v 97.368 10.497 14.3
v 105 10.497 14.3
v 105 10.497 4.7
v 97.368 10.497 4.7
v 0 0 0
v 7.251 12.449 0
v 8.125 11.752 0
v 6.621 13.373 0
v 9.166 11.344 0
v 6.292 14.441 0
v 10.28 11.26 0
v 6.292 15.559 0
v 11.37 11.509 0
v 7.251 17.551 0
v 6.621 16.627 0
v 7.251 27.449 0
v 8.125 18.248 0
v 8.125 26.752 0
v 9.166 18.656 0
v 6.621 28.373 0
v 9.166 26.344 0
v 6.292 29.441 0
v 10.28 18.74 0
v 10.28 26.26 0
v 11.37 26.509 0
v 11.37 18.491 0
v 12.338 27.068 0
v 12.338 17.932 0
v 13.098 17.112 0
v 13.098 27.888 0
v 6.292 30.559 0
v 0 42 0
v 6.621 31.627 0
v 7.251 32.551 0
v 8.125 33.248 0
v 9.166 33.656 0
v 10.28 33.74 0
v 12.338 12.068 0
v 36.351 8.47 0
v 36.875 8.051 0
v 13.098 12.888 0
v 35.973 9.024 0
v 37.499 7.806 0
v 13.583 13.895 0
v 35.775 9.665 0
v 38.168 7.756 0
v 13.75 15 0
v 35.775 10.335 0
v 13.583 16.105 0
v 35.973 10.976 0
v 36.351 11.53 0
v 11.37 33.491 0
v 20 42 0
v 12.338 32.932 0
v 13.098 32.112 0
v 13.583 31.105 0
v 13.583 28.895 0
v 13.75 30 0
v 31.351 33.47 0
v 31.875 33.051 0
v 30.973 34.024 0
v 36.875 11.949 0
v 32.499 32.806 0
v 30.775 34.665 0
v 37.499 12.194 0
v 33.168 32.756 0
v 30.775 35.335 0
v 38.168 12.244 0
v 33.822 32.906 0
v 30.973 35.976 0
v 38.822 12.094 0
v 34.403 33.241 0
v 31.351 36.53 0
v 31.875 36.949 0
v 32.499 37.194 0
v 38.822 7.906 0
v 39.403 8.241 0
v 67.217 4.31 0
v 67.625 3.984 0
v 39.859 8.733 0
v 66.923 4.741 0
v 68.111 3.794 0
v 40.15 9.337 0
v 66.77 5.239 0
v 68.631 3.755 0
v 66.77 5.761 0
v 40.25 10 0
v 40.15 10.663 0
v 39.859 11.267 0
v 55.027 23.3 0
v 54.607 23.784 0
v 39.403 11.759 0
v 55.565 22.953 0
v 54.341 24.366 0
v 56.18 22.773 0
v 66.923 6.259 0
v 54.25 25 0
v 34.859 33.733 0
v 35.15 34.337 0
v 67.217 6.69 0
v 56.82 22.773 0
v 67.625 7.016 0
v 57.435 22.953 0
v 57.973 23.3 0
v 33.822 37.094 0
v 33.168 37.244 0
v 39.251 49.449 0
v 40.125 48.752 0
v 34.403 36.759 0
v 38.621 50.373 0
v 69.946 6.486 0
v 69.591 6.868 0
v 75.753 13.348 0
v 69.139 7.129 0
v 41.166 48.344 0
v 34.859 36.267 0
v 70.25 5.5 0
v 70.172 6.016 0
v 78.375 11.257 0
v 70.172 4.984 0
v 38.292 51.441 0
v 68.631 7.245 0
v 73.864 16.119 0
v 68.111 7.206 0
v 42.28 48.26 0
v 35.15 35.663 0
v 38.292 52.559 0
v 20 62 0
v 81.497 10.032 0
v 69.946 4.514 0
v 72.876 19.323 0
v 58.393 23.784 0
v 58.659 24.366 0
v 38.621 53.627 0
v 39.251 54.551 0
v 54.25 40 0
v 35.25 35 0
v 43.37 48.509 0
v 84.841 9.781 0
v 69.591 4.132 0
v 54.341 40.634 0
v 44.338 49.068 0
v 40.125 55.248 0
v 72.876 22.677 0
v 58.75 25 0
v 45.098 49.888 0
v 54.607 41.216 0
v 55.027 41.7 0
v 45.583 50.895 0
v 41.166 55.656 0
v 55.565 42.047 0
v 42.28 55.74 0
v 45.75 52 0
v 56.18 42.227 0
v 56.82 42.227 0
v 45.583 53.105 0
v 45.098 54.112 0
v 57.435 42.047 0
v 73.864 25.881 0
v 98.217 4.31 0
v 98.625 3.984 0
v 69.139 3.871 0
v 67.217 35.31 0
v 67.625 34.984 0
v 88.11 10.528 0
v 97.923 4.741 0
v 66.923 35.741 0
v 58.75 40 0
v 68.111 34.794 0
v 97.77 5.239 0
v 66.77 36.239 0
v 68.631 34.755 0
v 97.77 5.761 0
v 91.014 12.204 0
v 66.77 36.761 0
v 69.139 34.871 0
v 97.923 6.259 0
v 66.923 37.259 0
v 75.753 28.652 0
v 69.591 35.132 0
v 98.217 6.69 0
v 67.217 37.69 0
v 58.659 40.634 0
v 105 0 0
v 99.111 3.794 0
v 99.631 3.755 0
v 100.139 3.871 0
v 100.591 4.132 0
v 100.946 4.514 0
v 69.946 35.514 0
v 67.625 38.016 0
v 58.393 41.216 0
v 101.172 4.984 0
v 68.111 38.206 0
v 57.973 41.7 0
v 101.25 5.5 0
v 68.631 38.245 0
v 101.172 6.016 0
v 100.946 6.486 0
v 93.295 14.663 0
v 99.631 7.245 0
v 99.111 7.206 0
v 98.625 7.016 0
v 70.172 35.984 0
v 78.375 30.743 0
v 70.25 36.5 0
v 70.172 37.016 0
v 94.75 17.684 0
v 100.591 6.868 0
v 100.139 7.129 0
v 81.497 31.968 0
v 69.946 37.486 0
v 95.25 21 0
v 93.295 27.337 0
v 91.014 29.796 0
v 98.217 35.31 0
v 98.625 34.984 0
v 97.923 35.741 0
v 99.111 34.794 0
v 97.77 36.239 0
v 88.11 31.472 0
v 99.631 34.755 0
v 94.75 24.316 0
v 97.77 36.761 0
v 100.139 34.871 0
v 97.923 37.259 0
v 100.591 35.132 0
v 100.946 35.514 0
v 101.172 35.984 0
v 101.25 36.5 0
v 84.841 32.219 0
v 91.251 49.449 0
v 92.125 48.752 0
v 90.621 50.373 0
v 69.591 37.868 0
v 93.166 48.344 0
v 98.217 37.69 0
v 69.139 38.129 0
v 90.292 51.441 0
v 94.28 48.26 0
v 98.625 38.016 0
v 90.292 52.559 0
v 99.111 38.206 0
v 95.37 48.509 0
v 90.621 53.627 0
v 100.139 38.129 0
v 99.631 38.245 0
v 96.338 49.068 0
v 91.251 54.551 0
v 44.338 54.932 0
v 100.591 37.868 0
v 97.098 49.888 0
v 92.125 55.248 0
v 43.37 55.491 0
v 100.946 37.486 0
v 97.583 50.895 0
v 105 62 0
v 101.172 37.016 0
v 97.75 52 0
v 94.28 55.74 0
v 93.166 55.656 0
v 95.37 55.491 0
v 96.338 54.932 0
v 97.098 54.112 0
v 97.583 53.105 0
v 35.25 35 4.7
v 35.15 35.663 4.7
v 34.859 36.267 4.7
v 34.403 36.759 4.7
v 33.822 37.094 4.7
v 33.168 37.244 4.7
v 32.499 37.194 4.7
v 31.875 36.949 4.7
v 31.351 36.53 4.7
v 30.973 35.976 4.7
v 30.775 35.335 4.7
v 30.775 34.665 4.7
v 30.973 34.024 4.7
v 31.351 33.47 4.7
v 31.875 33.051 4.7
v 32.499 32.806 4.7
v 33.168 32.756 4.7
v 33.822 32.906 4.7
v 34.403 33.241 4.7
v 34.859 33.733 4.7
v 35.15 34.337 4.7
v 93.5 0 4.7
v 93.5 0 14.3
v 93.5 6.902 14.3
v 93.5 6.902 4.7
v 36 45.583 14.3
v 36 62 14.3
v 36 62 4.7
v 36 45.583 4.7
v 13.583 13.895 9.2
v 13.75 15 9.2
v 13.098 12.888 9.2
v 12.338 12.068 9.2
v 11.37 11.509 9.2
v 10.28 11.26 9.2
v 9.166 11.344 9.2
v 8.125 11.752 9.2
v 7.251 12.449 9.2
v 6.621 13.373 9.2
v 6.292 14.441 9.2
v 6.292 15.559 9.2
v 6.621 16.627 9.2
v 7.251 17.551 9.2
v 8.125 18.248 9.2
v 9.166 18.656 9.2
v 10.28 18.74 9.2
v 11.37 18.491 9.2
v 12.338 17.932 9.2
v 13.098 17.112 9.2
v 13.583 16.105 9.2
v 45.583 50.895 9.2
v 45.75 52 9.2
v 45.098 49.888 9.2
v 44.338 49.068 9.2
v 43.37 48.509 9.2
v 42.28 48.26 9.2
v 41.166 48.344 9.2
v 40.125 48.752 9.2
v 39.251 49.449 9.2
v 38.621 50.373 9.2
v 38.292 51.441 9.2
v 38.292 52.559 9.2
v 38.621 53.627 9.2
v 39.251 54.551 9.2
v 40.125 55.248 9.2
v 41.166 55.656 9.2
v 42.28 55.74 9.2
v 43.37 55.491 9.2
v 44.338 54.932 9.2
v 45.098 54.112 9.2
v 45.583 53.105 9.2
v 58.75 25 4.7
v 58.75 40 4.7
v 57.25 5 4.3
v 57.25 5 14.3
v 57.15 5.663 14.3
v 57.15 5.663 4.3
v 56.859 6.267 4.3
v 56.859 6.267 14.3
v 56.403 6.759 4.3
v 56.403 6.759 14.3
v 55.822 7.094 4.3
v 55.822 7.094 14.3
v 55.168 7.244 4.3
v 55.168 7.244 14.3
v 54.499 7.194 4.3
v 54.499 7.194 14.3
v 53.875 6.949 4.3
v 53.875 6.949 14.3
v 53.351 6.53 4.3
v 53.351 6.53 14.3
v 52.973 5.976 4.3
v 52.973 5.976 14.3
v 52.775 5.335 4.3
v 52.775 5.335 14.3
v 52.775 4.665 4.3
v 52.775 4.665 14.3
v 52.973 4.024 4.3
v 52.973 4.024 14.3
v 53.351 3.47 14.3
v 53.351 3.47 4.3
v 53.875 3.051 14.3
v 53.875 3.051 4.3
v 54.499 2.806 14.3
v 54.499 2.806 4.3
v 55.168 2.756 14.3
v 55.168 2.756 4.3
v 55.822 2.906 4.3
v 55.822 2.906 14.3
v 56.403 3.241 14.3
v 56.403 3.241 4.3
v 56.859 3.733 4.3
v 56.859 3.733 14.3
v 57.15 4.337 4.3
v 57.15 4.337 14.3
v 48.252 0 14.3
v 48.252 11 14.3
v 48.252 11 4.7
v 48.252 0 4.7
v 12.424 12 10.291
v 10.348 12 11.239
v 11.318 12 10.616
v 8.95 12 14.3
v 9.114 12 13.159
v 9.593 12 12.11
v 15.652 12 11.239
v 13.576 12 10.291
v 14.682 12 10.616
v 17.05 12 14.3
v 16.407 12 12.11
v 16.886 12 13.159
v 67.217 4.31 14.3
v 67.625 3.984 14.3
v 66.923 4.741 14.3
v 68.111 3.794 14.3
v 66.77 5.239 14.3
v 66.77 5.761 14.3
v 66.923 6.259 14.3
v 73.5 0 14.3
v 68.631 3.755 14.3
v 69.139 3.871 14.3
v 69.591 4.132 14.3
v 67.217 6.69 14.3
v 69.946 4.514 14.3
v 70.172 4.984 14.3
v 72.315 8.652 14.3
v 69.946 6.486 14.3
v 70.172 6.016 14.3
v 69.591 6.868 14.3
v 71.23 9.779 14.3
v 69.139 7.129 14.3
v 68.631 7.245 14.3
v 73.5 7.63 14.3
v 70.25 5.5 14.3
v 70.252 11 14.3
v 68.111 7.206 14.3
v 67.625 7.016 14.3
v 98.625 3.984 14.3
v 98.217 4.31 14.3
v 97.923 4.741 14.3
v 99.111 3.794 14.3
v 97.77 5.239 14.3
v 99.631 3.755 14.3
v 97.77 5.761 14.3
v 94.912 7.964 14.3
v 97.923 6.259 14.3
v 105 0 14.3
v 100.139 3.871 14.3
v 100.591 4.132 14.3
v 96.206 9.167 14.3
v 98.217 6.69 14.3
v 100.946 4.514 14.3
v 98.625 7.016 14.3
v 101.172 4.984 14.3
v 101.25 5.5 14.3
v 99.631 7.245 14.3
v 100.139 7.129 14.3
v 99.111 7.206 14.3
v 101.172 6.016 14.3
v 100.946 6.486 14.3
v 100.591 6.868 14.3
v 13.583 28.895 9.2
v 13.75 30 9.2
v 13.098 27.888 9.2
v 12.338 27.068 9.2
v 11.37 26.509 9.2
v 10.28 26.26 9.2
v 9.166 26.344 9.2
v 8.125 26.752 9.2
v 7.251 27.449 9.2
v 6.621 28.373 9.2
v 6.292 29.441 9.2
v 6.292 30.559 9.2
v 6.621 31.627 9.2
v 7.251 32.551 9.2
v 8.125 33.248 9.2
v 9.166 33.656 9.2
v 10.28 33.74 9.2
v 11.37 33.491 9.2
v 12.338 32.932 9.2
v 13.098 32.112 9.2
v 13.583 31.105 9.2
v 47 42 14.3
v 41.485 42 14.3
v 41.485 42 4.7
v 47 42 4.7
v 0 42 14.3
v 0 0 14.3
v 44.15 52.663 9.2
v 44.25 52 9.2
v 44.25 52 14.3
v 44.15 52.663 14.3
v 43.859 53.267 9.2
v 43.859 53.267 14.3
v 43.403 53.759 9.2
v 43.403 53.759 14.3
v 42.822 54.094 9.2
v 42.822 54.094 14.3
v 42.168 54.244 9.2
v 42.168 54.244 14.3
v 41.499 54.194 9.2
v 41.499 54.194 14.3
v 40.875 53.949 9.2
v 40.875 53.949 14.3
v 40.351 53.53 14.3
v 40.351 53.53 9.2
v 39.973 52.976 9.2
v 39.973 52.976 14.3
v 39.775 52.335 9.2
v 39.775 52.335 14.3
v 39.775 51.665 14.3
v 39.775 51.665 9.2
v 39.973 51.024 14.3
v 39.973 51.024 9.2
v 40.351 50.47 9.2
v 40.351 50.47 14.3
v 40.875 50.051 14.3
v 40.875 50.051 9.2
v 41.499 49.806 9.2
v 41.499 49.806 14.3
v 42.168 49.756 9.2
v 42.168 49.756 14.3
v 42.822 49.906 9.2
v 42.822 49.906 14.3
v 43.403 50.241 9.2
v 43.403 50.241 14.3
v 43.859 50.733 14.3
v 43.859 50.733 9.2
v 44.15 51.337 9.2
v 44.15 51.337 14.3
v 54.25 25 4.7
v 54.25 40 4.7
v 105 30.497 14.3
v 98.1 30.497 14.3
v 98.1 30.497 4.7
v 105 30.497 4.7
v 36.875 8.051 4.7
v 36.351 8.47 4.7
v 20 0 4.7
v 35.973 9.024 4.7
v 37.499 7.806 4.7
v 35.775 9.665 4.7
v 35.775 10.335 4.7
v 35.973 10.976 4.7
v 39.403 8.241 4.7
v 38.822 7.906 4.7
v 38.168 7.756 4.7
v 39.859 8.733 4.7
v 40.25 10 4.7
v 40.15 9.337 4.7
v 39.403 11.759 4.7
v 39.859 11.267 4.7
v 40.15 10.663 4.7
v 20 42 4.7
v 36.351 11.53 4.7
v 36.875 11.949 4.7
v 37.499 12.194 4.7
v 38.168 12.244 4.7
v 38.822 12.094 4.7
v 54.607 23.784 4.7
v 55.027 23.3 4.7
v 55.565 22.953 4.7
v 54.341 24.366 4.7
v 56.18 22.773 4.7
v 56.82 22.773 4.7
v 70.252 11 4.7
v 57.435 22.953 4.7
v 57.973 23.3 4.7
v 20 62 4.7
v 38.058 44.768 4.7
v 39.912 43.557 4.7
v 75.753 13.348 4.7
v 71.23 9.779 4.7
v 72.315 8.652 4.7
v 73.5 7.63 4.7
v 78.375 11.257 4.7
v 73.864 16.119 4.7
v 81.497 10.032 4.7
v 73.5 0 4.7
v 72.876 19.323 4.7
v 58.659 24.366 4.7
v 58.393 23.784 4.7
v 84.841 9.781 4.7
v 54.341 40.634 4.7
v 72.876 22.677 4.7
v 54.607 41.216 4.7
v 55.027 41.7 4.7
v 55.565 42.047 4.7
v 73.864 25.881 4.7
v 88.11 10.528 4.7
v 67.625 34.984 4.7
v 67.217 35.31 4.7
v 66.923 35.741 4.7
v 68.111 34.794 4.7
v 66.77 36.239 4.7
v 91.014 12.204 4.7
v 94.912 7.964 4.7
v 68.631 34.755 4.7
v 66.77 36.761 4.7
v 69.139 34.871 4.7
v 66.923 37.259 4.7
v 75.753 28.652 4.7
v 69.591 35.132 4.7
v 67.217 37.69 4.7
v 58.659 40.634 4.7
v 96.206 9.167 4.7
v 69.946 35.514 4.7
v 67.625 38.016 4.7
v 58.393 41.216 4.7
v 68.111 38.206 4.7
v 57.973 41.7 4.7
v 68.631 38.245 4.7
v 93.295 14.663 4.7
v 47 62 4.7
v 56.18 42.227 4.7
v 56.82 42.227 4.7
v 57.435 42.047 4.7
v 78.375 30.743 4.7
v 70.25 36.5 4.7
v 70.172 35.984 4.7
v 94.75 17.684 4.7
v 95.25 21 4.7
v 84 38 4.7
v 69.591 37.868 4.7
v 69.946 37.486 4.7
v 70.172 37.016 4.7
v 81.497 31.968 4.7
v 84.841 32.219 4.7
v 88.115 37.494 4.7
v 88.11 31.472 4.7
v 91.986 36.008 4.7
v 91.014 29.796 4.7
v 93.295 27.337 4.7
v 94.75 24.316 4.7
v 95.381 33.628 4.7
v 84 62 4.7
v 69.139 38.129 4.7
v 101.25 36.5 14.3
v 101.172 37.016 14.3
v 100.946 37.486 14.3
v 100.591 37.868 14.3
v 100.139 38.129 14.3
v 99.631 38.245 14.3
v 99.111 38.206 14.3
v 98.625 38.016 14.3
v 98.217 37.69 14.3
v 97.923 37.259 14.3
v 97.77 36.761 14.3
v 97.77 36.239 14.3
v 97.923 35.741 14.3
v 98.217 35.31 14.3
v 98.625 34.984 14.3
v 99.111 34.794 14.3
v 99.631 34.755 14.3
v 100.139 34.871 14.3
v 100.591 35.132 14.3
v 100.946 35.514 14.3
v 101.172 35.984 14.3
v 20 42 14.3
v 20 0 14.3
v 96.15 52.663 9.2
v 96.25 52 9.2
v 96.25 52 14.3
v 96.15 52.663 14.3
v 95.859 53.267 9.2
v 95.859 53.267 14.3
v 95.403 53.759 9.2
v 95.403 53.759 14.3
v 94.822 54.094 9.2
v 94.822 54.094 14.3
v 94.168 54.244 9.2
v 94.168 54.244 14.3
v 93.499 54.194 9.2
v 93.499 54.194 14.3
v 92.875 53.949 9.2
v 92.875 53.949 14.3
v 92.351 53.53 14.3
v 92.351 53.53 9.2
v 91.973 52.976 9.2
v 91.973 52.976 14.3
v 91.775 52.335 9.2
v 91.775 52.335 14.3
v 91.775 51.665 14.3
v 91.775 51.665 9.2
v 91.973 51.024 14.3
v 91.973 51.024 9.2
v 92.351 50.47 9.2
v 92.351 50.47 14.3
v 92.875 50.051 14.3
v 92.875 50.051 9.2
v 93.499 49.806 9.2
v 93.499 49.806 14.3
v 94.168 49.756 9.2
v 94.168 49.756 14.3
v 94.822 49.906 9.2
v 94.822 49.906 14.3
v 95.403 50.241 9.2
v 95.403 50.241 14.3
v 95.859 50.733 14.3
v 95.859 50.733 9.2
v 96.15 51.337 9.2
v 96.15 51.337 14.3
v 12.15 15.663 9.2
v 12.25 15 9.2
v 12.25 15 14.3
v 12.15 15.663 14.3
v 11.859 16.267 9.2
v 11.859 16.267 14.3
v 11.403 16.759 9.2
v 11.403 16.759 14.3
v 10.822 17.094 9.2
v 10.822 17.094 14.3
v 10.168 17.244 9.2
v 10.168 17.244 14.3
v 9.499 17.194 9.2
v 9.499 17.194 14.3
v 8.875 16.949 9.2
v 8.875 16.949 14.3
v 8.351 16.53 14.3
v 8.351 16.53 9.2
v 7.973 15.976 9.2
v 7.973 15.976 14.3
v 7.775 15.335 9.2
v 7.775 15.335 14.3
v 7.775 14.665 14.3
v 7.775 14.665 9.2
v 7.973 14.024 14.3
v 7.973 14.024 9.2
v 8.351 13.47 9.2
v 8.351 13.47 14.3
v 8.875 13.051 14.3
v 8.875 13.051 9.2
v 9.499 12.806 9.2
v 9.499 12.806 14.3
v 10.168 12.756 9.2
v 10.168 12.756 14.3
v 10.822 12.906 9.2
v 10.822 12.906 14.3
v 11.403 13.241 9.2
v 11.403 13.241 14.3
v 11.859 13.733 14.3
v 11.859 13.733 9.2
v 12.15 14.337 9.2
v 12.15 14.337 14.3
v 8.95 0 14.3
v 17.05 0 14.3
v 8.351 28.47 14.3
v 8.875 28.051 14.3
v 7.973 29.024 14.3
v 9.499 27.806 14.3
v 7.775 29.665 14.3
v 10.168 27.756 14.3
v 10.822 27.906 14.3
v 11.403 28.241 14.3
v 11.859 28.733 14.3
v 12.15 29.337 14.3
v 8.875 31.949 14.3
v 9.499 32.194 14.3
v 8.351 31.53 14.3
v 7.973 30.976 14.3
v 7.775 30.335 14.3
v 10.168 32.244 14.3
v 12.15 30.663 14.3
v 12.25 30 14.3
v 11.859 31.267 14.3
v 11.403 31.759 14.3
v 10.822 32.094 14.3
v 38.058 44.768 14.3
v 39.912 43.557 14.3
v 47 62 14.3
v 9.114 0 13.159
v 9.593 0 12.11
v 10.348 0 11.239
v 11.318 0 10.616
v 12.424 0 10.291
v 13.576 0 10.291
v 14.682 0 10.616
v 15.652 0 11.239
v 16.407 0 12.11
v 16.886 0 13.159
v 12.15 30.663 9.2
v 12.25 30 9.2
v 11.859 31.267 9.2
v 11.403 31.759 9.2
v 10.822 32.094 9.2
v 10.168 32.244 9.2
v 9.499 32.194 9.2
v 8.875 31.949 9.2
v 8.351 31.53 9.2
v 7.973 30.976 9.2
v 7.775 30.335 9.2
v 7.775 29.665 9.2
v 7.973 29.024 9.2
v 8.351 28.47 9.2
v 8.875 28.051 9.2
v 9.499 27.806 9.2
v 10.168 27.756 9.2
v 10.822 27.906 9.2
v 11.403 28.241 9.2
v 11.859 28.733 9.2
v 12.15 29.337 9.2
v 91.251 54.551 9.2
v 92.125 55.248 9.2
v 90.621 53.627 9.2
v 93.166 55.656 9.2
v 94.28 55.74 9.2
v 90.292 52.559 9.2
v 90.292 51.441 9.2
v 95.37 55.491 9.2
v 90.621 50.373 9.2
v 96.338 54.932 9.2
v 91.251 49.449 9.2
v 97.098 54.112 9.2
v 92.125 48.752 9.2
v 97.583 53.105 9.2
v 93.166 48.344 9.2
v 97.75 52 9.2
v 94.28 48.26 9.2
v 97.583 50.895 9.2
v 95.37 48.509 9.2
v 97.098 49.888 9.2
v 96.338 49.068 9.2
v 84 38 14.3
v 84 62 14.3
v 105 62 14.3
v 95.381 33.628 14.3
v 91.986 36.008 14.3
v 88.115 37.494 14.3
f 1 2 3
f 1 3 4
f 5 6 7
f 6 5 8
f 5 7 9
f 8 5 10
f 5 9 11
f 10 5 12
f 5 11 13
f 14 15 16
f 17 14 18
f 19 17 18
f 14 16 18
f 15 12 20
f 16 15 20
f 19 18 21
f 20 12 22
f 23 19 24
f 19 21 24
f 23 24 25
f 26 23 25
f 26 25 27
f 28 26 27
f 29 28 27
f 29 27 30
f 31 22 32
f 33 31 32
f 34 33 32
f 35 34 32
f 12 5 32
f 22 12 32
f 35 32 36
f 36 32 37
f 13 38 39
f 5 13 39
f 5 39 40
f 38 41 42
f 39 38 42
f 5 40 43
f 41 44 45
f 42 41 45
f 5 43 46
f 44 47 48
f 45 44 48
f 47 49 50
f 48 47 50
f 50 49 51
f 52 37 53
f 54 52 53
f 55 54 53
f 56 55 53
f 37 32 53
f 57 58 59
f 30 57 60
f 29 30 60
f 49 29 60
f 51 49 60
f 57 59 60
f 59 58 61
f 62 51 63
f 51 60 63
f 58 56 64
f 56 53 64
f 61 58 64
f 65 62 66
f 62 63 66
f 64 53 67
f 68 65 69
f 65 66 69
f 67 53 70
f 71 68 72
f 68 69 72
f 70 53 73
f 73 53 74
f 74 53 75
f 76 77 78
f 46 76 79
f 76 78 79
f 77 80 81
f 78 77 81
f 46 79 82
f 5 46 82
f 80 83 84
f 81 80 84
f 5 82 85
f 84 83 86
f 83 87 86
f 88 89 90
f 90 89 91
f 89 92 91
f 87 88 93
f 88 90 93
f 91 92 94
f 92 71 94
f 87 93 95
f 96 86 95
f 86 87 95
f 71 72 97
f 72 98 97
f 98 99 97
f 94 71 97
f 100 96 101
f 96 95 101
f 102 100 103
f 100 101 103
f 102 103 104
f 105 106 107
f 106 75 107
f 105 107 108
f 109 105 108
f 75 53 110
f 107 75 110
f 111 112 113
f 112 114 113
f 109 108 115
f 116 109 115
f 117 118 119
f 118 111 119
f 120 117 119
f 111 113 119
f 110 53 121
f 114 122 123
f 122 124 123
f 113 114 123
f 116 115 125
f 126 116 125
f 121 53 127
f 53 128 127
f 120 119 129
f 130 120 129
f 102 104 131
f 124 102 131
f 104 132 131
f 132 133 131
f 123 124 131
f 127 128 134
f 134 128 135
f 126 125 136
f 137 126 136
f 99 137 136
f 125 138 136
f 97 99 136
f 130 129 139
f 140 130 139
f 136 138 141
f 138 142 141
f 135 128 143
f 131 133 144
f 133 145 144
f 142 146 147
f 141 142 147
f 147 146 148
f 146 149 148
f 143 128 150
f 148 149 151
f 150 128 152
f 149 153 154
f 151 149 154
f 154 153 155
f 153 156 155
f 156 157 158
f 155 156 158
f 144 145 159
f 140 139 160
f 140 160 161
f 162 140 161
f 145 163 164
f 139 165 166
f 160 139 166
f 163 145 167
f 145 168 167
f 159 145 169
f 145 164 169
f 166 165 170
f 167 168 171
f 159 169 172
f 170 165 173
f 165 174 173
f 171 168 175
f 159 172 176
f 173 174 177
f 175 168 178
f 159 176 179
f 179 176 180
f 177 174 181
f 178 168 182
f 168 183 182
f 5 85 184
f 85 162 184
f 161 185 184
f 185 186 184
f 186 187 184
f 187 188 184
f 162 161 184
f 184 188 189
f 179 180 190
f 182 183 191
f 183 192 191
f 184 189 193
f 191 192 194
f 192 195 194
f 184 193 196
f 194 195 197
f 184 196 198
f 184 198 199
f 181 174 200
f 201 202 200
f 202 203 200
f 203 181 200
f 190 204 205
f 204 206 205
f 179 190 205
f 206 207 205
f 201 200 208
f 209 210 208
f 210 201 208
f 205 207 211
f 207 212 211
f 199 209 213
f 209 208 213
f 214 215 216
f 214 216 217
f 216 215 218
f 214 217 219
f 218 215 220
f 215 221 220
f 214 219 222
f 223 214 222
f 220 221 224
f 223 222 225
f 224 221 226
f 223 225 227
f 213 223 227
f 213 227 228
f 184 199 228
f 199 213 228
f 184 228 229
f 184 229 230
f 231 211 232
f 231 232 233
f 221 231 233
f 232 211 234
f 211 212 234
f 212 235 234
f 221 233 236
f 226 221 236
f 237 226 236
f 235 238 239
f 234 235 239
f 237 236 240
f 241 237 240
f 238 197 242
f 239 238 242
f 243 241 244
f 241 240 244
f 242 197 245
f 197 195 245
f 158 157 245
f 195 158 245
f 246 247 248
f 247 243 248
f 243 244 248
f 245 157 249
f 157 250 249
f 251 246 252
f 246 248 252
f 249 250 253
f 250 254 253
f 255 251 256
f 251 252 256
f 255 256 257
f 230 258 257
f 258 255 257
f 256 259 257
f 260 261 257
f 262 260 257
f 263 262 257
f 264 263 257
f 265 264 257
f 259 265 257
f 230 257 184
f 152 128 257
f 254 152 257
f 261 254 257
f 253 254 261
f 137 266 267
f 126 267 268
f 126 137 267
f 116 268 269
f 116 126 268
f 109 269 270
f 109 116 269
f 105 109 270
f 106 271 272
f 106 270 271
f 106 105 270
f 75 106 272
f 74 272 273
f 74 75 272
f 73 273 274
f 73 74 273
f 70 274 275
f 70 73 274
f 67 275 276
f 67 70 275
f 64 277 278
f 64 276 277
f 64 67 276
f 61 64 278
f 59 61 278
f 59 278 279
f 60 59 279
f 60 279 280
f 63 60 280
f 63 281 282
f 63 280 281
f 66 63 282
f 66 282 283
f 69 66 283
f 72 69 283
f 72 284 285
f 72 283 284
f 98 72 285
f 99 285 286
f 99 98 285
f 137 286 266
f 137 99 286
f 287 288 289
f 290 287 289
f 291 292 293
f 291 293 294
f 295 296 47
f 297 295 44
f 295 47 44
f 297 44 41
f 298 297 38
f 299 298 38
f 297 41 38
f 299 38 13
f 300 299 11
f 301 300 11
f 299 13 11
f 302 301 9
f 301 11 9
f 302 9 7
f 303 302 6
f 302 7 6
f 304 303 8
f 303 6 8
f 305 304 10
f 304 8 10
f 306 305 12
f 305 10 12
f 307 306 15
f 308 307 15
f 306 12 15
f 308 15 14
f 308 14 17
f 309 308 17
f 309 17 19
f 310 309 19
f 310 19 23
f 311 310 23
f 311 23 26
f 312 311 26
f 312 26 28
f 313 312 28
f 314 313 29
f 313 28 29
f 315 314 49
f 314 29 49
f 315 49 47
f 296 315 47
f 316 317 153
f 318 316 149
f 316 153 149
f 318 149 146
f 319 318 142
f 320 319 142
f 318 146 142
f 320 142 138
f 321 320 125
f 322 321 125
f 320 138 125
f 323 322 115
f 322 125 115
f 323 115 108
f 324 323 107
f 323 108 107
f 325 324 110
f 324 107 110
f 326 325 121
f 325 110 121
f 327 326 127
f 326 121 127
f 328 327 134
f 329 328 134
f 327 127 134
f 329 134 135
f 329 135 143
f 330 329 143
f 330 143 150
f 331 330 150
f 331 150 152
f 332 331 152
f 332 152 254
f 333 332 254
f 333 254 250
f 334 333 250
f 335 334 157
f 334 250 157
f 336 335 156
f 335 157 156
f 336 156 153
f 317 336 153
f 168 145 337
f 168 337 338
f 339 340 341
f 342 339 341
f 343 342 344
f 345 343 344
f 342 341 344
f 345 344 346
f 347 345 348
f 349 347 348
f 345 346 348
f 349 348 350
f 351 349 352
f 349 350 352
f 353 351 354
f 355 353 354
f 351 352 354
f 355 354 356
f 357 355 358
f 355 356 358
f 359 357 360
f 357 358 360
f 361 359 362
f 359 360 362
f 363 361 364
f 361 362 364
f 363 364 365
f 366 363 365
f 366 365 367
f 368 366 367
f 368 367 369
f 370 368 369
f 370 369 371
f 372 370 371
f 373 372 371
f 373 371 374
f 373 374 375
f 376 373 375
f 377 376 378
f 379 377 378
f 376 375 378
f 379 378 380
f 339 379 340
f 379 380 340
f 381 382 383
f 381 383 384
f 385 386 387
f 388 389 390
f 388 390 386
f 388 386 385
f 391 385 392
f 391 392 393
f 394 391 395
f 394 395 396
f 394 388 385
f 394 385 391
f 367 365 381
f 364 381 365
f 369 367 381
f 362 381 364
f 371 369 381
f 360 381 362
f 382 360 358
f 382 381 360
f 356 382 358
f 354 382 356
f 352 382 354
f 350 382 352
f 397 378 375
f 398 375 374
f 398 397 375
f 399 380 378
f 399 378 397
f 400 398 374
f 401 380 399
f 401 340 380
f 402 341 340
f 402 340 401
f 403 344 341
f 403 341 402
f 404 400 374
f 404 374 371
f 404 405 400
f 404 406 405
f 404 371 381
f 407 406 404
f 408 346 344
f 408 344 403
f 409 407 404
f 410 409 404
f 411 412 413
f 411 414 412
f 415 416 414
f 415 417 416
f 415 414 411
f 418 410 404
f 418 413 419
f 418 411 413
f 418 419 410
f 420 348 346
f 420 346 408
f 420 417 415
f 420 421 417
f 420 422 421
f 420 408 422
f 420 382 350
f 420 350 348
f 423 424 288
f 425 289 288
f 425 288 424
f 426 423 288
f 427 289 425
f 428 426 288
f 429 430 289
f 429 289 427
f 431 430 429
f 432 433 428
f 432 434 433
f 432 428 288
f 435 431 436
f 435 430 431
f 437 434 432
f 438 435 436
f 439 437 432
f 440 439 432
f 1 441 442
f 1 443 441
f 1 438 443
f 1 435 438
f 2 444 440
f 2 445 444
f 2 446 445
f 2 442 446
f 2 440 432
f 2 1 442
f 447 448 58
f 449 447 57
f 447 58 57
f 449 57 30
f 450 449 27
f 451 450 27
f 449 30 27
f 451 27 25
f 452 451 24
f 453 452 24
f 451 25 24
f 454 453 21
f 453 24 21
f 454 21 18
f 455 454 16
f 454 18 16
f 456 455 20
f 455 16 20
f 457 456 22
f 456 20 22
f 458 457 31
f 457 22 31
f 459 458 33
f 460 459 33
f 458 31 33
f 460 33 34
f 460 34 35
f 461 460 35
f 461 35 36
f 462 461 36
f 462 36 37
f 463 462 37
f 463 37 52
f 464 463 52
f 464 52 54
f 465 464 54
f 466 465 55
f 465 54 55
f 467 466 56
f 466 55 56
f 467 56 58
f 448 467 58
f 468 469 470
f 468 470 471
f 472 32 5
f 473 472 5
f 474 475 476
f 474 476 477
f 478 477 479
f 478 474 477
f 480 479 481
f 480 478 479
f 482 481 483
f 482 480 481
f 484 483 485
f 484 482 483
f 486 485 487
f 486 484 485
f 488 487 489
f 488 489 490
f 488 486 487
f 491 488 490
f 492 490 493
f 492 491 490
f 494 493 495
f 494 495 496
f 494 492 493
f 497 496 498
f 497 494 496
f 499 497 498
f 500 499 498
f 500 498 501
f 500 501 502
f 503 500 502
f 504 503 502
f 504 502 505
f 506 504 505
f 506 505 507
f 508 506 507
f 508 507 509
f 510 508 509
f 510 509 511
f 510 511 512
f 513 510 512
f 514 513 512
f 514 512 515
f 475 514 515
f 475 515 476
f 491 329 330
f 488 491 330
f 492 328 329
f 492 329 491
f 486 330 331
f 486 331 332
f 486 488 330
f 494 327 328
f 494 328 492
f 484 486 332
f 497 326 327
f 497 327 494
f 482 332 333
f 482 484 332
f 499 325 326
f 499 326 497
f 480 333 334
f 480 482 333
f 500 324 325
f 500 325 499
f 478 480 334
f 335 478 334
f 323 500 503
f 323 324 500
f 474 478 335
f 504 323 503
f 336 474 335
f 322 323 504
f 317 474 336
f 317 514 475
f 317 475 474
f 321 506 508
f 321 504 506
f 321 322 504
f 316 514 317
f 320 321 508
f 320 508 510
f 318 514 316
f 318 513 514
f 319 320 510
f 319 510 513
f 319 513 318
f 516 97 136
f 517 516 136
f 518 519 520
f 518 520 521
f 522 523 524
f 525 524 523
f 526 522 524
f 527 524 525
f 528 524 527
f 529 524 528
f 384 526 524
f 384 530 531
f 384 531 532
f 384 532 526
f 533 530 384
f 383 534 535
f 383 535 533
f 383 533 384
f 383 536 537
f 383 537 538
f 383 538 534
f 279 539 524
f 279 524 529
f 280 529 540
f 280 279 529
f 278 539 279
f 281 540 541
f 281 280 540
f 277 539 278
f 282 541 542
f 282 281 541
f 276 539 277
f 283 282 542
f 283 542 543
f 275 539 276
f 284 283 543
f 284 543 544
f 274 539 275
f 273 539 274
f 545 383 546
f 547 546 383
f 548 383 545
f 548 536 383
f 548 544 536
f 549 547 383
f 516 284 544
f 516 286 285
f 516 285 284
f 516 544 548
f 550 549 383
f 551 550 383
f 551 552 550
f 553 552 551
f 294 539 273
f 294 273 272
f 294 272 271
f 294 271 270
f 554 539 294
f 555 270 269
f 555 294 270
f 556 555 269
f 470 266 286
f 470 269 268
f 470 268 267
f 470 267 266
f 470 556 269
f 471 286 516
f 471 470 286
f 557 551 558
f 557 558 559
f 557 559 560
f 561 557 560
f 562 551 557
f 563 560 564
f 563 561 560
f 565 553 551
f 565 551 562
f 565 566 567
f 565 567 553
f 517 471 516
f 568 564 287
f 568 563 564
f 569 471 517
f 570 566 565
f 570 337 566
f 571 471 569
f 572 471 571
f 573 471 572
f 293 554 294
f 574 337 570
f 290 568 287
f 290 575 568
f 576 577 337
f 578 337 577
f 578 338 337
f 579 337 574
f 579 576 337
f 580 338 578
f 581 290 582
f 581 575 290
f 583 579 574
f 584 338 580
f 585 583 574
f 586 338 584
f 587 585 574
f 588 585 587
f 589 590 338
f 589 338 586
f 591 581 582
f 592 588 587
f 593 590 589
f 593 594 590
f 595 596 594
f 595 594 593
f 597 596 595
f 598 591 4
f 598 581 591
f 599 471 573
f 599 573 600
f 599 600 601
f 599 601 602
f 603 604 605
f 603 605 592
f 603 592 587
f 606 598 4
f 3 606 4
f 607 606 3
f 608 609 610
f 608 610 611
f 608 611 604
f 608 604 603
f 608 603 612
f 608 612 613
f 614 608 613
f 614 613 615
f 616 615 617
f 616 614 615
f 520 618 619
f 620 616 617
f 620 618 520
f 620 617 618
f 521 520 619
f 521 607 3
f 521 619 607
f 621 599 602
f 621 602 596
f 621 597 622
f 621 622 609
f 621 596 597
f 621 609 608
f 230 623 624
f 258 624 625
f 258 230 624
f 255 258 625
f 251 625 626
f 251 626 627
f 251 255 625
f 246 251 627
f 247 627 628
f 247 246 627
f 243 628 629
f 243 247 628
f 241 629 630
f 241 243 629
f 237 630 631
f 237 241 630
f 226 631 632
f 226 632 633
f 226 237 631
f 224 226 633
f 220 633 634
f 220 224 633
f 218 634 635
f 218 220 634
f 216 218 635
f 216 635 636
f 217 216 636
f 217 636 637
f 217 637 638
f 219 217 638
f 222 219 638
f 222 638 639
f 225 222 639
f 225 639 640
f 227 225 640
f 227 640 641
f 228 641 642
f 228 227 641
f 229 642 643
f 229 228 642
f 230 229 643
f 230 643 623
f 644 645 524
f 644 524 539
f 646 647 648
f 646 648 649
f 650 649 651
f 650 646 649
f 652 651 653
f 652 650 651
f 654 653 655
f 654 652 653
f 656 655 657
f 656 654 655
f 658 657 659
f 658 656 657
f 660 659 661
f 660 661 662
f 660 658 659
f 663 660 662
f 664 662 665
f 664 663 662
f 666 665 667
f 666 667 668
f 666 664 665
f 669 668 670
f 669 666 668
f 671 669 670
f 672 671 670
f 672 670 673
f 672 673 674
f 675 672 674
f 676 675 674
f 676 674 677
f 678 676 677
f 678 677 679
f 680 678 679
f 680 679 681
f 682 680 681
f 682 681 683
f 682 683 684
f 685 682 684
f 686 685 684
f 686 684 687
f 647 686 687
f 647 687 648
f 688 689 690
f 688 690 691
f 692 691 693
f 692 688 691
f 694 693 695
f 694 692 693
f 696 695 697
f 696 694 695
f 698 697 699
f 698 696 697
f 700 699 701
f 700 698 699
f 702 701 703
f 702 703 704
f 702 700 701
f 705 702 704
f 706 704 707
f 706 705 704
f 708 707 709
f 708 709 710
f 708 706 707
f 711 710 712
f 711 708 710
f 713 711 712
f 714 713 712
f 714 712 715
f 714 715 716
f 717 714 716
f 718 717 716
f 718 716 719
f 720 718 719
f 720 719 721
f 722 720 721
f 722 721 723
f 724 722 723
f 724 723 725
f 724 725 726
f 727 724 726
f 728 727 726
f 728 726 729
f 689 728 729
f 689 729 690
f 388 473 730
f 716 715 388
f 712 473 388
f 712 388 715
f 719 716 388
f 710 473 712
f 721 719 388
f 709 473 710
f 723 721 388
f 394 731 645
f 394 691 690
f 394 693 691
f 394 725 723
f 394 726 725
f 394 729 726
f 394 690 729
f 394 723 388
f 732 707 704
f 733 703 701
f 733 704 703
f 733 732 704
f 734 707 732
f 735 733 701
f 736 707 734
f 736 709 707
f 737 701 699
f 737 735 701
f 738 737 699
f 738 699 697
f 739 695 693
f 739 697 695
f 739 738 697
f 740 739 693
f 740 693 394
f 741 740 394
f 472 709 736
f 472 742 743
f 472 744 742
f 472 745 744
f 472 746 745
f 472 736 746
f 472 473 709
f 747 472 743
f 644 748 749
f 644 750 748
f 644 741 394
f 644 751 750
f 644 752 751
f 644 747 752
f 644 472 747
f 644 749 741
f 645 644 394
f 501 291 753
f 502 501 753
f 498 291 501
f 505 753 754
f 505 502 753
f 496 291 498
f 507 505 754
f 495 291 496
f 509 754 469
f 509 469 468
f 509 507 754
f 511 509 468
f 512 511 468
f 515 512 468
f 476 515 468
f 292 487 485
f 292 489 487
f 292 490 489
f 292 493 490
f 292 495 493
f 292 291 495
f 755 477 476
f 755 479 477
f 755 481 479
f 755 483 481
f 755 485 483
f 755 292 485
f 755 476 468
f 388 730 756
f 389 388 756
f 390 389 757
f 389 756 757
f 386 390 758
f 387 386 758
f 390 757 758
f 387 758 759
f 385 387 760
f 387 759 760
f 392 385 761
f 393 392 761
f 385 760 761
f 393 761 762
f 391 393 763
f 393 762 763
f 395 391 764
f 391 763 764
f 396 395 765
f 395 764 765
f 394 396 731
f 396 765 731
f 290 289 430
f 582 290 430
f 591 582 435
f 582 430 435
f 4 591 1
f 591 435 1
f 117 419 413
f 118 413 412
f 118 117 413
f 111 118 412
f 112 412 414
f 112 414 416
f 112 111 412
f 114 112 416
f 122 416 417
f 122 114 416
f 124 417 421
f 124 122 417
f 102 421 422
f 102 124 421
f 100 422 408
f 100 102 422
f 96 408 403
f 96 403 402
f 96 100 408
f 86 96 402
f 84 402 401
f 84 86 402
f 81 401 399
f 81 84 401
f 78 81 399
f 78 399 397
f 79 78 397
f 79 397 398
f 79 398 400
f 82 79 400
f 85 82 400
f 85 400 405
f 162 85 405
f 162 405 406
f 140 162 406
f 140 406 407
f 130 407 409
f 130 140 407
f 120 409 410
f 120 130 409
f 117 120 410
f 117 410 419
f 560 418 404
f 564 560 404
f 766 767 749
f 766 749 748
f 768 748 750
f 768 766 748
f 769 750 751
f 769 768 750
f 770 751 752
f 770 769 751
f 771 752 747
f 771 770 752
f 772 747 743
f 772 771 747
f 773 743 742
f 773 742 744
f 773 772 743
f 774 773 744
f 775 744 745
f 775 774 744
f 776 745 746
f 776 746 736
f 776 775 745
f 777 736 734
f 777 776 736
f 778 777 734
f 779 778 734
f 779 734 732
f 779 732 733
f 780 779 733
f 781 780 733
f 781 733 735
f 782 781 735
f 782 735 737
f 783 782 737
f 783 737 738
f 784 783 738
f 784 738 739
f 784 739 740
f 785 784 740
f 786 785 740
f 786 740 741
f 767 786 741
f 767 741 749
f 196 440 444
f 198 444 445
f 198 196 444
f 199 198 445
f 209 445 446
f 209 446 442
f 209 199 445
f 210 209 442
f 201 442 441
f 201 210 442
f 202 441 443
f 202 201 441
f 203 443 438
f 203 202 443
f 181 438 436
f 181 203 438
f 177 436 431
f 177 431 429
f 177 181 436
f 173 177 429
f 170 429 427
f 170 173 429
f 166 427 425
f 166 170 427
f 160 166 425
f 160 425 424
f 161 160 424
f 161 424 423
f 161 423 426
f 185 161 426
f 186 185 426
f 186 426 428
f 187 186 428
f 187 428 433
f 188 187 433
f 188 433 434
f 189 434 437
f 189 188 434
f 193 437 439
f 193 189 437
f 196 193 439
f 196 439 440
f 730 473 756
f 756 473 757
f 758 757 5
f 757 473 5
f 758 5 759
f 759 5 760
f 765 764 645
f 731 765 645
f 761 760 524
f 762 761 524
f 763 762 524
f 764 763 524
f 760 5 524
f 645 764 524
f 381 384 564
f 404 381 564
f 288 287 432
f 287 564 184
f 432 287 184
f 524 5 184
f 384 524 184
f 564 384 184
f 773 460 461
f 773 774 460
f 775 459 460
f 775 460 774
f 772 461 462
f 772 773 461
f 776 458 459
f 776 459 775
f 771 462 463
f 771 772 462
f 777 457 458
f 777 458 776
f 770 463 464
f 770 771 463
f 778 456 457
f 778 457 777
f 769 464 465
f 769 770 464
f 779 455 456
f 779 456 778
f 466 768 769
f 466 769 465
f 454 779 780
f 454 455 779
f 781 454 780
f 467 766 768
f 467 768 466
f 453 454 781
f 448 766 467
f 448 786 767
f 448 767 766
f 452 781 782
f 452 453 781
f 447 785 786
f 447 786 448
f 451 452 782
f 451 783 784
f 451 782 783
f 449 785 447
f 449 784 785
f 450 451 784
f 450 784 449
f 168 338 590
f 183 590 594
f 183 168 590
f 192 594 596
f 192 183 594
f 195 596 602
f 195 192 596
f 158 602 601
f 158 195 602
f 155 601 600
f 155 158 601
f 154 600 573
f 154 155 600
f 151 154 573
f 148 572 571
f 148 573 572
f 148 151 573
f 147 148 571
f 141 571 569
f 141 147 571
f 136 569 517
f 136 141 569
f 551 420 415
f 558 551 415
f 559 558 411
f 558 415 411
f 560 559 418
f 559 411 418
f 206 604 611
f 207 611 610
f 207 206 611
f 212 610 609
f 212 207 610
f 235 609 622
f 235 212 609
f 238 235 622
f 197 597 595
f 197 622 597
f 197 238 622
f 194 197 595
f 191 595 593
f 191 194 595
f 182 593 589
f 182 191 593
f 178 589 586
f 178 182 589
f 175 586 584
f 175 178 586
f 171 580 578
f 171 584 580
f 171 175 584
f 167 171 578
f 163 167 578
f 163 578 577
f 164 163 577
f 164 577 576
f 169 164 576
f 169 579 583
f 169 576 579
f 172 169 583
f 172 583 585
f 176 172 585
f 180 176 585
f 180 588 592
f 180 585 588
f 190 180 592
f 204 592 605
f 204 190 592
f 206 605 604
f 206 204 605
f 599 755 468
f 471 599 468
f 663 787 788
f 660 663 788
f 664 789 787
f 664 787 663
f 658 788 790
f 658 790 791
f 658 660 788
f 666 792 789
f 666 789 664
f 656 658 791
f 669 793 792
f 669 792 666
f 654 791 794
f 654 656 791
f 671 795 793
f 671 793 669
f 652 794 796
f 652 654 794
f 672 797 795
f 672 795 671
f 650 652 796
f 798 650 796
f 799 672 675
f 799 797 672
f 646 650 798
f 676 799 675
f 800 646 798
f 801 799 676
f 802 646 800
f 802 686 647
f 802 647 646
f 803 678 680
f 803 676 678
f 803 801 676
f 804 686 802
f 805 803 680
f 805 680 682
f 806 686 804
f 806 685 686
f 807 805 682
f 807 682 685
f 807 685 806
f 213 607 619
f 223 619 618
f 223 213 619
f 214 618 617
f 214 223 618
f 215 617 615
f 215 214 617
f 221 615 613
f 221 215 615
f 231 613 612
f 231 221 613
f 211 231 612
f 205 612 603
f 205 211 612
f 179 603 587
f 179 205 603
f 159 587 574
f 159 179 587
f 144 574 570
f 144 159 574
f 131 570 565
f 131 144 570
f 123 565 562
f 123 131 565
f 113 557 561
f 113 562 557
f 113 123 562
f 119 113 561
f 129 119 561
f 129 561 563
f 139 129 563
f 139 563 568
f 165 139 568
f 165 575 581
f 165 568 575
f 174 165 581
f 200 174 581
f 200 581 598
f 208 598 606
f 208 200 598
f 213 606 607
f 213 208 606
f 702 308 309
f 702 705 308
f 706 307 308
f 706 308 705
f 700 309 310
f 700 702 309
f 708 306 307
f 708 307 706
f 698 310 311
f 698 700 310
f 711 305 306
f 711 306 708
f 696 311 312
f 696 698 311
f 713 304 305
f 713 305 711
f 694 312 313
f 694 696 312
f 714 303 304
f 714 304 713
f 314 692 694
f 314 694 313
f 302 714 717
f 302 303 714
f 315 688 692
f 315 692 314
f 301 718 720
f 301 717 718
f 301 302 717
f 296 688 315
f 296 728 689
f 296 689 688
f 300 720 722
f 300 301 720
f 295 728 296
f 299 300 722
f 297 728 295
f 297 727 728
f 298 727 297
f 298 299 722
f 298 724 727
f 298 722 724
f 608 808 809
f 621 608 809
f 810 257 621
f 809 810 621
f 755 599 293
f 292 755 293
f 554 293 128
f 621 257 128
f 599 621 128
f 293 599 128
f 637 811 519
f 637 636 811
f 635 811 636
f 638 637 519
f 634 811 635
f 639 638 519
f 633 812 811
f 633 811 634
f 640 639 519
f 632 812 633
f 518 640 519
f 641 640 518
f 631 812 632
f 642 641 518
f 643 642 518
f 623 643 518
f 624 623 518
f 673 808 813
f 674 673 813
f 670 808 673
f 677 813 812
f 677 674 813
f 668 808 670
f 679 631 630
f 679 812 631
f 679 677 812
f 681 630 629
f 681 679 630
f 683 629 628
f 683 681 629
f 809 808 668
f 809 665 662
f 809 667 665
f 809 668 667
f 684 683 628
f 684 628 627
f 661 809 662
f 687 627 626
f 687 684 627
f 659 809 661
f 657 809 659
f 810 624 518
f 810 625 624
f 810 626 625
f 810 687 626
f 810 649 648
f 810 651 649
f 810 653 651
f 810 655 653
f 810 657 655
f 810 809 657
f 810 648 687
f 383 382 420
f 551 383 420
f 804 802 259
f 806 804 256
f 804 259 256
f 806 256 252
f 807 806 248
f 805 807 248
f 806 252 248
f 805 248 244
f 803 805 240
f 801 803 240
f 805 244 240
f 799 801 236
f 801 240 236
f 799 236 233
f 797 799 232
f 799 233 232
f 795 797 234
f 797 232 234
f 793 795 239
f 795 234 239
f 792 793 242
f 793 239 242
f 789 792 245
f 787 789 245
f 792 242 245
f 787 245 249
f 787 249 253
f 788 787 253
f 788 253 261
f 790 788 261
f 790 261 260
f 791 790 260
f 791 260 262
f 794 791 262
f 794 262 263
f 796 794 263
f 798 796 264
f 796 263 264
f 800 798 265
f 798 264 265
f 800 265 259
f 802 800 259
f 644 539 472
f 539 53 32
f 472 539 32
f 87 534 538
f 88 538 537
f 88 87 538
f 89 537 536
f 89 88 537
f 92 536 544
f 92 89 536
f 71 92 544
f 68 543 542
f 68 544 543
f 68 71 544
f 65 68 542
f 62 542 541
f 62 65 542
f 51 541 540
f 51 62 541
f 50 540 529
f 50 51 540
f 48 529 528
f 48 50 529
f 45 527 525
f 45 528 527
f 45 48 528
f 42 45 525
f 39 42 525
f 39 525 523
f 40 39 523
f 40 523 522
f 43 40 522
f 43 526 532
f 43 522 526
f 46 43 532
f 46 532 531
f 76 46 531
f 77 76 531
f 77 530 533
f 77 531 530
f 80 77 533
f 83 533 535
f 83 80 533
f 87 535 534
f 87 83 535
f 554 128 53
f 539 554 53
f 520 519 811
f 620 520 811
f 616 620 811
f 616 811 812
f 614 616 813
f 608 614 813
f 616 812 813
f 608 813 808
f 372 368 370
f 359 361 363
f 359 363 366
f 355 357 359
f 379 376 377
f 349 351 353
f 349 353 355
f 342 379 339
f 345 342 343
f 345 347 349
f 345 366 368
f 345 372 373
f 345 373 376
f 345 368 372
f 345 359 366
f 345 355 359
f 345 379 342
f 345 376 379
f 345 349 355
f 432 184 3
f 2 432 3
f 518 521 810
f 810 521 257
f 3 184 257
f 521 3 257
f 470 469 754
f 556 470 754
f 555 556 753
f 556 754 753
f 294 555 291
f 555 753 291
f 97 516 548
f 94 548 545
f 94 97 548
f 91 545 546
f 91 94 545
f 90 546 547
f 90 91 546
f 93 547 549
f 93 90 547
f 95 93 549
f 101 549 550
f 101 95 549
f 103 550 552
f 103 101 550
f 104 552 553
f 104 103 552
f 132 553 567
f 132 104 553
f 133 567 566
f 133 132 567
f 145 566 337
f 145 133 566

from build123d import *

# Parameters (mm, degrees)
SKETCH_R        = 2.25
SKETCH_R_2      = 11.25
SKETCH_R_3      = 1.75
PAD_DEPTH       = 14.3
POCKET_DEPTH    = 9.6
SKETCH004_R     = 2.25
POCKET003_DEPTH = 10
SKETCH005_R     = 4.05
POCKET004_DEPTH = 12
SKETCH006_R     = 3.75
POCKET005_DEPTH = 9.2


with BuildPart() as part:
    # Sketch → Pad (new body)
    with BuildSketch(Plane.XY):
        Polygon((0, 0), (105, 0), (105, 62), (20, 62), (20, 42), (0, 42), align=None)
        with Locations((38, 10)):
            Circle(SKETCH_R, mode=Mode.SUBTRACT)
        with Locations((33, 35)):
            Circle(SKETCH_R, mode=Mode.SUBTRACT)
        with Locations((84, 21)):
            Circle(SKETCH_R_2, mode=Mode.SUBTRACT)
        with Locations((68.5, 36.5)):
            Circle(SKETCH_R_3, mode=Mode.SUBTRACT)
        with Locations((99.5, 36.5)):
            Circle(SKETCH_R_3, mode=Mode.SUBTRACT)
        with Locations((68.5, 5.5)):
            Circle(SKETCH_R_3, mode=Mode.SUBTRACT)
        with Locations((99.5, 5.5)):
            Circle(SKETCH_R_3, mode=Mode.SUBTRACT)
        with Locations((10, 30)):
            Circle(SKETCH_R, mode=Mode.SUBTRACT)
        with Locations((10, 15)):
            Circle(SKETCH_R, mode=Mode.SUBTRACT)
        with Locations((42, 52)):
            Circle(SKETCH_R, mode=Mode.SUBTRACT)
        with Locations((94, 52)):
            Circle(SKETCH_R, mode=Mode.SUBTRACT)
        with BuildLine():
            Line((58.75, 25), (58.75, 39.999999))
            ThreePointArc((58.75, 39.999999), (56.5, 42.25), (54.25, 39.999998))
            Line((54.25, 25.000001), (54.25, 39.999998))
            ThreePointArc((54.25, 25.000001), (56.5, 22.75), (58.75, 25))
        make_face(mode=Mode.SUBTRACT)
    extrude(amount=PAD_DEPTH)

    # Sketch001 → Pocket (cut)
    with BuildSketch(Plane.XY.offset(14.3)):
        with BuildLine():
            ThreePointArc((41.485277, 42), (39.015593, 44.209375), (35.999996, 45.583005))
            Line((35.999996, 67), (35.999996, 45.583005))
            Line((20, 67), (35.999996, 67))
            Line((20, -1), (20, 67))
            Line((20, -1), (48.252269, -1))
            Line((48.252269, 11), (48.252269, -1))
            Line((48.252269, 11), (70.252269, 11))
            ThreePointArc((70.252269, 11), (71.759618, 9.202833), (73.499996, 7.630258))
            Line((73.499996, 7.630258), (73.499996, -1))
            Line((73.499996, -1), (93.499996, -1))
            Line((93.499996, -1), (93.499996, 6.902128))
            ThreePointArc((93.499996, 6.902128), (95.574295, 8.548671), (97.367695, 10.497399))
            Line((105.499996, 10.497399), (97.367695, 10.497399))
            Line((105.499996, 30.497399), (105.499996, 10.497399))
            Line((98.099621, 30.497399), (105.499996, 30.497399))
            ThreePointArc((98.099621, 30.497399), (91.98574, 36.007594), (83.999996, 38))
            Line((83.999996, 38), (83.999996, 67))
            Line((83.999996, 67), (46.999996, 67))
            Line((46.999996, 67), (46.999996, 42))
            Line((41.485277, 42), (46.999996, 42))
        make_face()
    extrude(amount=-POCKET_DEPTH, mode=Mode.SUBTRACT)

    # Sketch004 → Pocket003 (cut)
    with BuildSketch(Plane.XY.offset(14.3)):
        with Locations((55, 5)):
            Circle(SKETCH004_R)
    extrude(amount=-POCKET003_DEPTH, mode=Mode.SUBTRACT)

    # Sketch005 → Pocket004 (cut)
    with BuildSketch(Plane.XZ):
        with Locations((13, 14.3)):
            Circle(SKETCH005_R)
    extrude(amount=-POCKET004_DEPTH, mode=Mode.SUBTRACT)

    # Sketch006 → Pocket005 (cut)
    with BuildSketch(Plane(origin=(0, 0, 0), x_dir=(1, 0, 0), z_dir=(0, 0, -1))):
        with Locations((10, -15)):
            Circle(SKETCH006_R)
        with Locations((10, -30)):
            Circle(SKETCH006_R)
        with Locations((42, -52)):
            Circle(SKETCH006_R)
        with Locations((94, -52)):
            Circle(SKETCH006_R)
    extrude(amount=-POCKET005_DEPTH, mode=Mode.SUBTRACT)


solid = part.part
